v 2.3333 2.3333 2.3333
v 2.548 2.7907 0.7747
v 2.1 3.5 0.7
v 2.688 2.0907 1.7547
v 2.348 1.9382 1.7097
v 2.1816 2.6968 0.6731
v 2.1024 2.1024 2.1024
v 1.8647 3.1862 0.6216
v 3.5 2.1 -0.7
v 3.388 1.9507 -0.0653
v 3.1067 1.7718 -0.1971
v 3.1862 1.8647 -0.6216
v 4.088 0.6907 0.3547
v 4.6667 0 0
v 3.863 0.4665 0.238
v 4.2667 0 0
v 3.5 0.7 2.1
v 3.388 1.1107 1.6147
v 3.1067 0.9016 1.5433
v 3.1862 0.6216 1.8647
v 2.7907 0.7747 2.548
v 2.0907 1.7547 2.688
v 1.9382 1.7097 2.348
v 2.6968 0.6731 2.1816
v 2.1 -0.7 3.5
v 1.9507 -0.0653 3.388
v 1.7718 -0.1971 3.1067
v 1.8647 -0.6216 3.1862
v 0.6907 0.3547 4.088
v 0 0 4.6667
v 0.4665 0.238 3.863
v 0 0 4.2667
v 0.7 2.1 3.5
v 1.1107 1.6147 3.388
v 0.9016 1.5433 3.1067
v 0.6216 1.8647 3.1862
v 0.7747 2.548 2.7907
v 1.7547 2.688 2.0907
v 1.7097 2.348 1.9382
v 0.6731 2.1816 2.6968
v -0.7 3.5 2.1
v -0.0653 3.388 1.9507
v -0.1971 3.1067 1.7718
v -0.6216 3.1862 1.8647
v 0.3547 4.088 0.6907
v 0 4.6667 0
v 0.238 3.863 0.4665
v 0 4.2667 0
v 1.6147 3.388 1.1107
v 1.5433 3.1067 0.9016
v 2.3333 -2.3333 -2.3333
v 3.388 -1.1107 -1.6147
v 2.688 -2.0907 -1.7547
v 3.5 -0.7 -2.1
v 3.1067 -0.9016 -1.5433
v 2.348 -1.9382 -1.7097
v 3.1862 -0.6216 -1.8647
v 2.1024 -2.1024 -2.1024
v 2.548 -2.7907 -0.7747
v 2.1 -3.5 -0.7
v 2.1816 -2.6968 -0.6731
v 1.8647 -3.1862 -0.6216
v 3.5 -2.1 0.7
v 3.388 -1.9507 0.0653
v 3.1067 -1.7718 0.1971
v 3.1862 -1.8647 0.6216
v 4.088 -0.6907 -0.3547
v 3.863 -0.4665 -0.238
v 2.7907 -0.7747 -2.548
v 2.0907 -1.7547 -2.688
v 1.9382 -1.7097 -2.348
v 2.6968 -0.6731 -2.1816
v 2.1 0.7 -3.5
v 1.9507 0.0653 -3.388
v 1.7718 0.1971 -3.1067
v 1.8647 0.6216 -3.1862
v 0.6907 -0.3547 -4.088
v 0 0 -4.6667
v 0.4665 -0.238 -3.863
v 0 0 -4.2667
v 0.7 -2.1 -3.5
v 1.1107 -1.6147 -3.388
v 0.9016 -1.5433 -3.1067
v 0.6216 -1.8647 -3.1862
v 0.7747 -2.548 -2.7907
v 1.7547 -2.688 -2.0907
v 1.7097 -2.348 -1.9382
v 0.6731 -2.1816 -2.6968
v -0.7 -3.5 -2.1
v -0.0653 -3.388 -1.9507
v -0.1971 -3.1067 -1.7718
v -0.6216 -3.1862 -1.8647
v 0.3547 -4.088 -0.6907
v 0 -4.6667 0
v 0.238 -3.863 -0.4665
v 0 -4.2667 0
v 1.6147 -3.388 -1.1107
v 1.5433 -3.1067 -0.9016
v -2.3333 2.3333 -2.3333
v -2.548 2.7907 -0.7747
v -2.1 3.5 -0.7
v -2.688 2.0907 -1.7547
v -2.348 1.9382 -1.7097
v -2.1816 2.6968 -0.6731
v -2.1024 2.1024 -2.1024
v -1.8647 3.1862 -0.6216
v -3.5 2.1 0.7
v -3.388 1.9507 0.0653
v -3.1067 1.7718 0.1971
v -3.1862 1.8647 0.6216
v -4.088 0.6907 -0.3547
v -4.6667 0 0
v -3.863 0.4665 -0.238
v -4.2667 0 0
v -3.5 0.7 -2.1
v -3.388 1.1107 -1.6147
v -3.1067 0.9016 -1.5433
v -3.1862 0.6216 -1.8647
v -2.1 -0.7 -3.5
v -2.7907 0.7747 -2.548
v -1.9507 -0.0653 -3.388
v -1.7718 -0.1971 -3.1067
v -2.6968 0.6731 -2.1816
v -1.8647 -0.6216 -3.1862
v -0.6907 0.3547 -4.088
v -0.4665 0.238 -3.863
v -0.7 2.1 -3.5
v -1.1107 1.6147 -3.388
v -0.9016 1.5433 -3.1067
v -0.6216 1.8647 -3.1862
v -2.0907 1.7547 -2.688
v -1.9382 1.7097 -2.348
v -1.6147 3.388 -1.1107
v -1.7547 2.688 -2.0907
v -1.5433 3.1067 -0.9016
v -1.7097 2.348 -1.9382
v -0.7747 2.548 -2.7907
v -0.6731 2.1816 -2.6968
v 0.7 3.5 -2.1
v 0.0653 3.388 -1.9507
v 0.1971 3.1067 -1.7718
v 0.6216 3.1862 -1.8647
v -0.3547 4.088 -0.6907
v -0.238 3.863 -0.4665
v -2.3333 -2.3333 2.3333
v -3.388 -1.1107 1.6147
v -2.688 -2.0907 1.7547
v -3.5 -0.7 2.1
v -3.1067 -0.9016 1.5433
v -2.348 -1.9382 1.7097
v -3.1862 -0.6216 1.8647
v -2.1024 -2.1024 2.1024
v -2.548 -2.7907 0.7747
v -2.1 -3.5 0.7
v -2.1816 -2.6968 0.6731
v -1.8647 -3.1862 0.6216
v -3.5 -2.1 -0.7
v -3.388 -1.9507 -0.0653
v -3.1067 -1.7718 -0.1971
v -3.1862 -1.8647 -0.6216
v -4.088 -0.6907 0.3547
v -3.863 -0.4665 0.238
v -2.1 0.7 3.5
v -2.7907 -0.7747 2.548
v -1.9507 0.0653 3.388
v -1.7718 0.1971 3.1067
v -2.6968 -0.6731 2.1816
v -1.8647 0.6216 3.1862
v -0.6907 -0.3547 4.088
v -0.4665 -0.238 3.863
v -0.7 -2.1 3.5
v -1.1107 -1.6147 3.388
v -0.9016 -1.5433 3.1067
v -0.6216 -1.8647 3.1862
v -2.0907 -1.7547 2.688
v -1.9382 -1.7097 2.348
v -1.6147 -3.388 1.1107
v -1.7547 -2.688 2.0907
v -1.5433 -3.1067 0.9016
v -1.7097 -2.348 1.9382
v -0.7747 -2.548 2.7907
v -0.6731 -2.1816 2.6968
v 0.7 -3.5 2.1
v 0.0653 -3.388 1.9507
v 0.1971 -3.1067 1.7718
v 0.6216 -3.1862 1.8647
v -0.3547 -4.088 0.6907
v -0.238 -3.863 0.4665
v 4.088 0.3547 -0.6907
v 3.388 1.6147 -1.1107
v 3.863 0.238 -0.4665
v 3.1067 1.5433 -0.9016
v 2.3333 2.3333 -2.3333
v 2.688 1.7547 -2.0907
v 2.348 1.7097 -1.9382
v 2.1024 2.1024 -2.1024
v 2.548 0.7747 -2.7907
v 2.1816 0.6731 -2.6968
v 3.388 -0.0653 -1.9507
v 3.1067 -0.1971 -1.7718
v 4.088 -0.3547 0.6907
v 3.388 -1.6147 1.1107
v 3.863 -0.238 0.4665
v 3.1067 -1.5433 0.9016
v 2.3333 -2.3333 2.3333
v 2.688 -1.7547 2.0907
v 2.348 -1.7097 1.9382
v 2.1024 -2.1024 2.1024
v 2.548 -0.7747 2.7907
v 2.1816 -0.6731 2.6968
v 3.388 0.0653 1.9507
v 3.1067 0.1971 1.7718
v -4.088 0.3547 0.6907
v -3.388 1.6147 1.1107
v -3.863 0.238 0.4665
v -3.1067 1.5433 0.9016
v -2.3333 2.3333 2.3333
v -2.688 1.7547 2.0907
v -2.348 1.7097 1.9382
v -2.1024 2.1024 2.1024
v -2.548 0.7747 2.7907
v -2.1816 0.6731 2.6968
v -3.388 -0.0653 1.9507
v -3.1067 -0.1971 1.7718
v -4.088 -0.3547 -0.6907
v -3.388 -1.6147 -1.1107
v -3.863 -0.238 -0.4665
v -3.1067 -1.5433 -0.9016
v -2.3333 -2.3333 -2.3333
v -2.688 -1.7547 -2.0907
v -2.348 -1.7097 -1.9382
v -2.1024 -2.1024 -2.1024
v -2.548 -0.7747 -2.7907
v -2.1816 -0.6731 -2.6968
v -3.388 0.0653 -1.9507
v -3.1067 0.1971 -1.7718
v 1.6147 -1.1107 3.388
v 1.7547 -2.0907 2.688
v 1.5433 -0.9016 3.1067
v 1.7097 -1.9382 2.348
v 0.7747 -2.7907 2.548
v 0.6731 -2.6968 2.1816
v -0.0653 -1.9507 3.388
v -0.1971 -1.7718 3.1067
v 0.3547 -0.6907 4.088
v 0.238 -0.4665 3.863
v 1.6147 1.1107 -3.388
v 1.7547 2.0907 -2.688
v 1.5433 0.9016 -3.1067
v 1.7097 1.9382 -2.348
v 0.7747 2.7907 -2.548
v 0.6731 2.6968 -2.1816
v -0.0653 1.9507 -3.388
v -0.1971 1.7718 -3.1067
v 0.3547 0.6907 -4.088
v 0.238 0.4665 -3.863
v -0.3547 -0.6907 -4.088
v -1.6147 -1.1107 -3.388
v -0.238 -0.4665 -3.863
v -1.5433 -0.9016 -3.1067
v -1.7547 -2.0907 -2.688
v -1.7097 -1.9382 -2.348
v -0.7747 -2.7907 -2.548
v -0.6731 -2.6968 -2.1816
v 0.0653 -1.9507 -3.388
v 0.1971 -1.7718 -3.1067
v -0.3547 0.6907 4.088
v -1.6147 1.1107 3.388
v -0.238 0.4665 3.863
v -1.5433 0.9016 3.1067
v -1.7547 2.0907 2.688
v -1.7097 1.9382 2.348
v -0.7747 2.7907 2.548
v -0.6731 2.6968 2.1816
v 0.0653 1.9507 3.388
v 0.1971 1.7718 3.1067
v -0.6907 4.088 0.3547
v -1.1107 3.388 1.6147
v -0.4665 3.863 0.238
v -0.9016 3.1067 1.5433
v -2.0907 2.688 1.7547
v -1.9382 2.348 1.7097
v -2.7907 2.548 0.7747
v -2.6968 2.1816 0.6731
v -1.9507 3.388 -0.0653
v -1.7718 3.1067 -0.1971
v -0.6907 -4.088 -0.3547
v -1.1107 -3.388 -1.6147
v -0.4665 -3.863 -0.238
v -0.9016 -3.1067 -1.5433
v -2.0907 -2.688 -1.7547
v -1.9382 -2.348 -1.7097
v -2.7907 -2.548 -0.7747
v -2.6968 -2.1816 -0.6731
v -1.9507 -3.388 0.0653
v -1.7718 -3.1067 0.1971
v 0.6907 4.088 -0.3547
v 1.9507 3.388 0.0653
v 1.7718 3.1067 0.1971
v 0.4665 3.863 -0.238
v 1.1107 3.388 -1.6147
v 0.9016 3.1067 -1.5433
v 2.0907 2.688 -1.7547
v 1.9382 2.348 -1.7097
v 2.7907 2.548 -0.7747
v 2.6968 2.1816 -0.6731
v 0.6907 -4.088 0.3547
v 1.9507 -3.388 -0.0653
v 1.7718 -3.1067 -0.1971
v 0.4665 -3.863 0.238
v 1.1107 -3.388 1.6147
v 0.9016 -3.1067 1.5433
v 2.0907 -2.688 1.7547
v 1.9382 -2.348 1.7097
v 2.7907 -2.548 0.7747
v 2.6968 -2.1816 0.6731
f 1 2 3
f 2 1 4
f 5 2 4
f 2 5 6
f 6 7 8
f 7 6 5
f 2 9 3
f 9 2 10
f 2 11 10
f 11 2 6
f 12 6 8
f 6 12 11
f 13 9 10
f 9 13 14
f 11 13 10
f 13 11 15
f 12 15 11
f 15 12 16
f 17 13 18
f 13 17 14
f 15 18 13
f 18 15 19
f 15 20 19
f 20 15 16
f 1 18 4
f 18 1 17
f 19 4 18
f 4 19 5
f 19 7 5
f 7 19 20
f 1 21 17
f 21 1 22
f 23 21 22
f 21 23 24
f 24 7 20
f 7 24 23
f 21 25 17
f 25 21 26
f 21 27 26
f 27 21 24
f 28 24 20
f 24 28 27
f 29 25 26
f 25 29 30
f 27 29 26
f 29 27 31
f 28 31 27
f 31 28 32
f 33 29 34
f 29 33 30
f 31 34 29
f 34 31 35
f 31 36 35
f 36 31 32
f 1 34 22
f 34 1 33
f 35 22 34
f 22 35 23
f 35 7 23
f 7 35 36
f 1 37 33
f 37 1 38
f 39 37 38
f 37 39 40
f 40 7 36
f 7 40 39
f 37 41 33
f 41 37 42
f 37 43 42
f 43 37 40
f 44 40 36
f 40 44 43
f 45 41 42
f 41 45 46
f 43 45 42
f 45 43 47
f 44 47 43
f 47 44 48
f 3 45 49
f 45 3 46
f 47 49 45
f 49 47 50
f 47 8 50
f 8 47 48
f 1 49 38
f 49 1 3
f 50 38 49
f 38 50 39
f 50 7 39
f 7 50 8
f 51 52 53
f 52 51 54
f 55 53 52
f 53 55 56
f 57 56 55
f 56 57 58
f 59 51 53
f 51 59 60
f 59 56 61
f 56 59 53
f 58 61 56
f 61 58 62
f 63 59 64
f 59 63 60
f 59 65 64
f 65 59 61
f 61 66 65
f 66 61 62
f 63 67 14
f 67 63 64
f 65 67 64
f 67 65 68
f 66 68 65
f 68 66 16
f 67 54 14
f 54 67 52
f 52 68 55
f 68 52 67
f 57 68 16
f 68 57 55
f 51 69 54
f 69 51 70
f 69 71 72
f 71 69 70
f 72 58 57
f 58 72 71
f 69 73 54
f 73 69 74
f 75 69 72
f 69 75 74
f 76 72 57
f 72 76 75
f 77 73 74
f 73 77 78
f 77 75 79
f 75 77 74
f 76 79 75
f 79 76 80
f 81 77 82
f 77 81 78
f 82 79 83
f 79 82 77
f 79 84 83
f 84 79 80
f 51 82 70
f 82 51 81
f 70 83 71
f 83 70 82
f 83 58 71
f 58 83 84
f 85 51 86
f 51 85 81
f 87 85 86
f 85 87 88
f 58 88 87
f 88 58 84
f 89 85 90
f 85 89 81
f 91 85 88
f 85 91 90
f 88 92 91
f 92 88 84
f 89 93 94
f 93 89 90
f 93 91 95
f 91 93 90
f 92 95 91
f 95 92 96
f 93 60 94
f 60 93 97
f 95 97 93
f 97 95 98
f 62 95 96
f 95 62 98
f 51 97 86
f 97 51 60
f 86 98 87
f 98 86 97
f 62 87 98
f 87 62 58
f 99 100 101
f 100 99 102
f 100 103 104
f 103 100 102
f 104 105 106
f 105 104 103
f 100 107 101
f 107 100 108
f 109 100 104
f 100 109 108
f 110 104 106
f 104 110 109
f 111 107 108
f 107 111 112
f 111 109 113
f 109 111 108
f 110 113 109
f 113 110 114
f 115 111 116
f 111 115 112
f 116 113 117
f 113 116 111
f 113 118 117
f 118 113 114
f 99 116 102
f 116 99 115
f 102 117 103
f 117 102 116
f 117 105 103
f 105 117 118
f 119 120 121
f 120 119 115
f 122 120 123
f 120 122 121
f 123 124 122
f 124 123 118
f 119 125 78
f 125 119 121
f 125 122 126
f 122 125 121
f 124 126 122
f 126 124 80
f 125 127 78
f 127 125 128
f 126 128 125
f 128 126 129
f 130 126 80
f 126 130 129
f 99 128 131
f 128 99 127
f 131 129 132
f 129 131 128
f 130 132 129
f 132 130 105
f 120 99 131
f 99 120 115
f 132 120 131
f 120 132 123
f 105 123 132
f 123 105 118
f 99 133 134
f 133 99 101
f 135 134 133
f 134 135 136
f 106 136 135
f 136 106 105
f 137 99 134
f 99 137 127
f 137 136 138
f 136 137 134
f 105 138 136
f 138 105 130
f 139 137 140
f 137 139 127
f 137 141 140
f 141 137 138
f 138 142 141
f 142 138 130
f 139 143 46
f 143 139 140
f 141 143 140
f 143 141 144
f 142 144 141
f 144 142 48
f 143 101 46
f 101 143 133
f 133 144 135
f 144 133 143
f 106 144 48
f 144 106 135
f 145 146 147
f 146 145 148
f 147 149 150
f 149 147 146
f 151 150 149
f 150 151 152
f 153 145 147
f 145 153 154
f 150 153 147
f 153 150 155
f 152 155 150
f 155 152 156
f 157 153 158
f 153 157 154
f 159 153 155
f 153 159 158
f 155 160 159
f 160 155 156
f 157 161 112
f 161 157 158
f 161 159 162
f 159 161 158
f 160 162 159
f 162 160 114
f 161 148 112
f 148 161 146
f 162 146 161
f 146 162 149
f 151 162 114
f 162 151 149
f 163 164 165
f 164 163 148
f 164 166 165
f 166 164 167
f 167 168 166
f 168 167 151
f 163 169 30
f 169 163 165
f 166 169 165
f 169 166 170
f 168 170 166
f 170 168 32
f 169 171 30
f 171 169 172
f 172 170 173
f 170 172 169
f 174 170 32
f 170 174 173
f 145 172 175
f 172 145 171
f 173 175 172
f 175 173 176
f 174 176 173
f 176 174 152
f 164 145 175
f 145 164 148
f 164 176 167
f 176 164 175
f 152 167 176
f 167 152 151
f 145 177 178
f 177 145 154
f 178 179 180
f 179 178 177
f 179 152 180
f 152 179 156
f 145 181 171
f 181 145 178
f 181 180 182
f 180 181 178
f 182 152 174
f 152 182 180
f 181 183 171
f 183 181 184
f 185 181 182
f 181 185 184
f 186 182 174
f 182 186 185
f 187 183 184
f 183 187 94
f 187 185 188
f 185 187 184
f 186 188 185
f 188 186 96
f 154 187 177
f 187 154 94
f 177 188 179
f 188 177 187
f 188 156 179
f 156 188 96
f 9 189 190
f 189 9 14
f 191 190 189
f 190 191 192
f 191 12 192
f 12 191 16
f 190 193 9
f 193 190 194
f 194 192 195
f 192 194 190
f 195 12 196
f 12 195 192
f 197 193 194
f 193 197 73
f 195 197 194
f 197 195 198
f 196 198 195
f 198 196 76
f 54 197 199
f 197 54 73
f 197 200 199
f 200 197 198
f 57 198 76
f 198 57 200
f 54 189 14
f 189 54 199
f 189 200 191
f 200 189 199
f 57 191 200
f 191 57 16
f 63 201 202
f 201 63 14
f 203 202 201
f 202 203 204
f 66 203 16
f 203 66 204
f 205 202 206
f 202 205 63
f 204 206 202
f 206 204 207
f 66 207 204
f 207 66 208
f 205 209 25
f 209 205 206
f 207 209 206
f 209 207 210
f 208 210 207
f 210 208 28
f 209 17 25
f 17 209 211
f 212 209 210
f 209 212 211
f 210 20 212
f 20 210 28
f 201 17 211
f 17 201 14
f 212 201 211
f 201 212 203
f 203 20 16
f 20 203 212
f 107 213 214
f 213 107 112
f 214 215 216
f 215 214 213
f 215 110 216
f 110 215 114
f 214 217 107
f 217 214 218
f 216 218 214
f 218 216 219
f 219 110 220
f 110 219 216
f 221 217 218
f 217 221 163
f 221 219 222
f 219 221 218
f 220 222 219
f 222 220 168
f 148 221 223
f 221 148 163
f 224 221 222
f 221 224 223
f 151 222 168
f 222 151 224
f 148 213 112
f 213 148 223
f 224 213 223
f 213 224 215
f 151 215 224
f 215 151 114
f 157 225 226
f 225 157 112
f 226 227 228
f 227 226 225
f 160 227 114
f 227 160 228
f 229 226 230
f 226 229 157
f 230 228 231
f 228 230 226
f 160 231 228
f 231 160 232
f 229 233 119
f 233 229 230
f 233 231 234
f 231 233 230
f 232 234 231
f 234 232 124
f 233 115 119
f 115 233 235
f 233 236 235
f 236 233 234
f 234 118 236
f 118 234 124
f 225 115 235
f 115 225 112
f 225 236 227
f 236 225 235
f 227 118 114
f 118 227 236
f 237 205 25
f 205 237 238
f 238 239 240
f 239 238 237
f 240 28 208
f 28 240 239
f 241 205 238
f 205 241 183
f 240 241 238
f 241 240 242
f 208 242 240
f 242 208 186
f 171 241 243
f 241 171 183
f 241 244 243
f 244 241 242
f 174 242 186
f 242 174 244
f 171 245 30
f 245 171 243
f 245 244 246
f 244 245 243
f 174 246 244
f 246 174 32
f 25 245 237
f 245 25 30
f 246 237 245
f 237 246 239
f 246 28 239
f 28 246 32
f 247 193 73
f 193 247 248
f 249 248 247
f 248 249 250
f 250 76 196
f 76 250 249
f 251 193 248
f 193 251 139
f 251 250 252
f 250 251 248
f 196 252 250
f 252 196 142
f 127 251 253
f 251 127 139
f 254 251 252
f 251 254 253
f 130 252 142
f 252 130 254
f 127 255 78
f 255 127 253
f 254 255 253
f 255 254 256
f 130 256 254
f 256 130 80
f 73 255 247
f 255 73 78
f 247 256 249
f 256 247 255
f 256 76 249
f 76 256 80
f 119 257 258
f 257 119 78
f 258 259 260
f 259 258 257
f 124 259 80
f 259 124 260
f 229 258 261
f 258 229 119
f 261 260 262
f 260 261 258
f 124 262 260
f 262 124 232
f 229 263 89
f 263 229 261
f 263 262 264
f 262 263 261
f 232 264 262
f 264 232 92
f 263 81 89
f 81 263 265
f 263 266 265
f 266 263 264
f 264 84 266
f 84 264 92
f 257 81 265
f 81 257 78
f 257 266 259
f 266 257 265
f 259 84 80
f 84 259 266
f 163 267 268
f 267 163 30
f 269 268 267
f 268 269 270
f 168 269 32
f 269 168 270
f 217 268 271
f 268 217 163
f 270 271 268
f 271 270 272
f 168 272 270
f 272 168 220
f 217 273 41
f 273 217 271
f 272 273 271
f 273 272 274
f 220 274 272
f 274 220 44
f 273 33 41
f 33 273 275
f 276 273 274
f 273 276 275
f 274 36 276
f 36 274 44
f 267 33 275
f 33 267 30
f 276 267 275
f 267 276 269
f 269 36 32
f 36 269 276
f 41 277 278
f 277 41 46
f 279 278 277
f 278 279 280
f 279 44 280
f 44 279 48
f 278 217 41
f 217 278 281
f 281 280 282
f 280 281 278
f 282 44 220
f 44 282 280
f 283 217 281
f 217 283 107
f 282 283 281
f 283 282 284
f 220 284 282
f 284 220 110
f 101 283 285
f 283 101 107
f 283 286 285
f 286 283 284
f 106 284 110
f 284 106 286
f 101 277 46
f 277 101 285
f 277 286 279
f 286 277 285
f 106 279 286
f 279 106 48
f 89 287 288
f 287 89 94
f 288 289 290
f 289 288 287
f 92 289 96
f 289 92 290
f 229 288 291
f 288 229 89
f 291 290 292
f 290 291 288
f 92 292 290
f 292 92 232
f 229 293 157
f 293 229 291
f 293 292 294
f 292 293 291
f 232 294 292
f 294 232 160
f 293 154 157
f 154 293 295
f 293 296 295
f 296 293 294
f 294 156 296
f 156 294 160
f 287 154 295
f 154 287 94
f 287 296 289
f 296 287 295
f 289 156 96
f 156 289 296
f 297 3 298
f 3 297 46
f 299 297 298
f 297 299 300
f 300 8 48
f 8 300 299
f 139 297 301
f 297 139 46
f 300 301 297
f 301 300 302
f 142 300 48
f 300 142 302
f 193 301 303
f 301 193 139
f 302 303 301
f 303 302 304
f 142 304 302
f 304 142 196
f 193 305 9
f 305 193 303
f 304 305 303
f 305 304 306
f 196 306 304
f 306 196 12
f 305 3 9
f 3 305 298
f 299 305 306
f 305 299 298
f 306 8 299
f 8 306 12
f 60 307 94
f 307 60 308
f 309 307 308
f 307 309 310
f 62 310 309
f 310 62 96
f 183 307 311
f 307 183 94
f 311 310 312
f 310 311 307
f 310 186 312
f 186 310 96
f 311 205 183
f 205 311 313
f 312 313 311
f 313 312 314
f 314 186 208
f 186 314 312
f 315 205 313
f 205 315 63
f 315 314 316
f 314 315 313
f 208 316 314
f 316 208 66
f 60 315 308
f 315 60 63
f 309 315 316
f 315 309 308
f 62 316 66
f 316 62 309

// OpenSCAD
use <conway2.scad>
function _slice(list,start,end=undef) =
    let(end = end==undef?len(list):end)
    [for(i=[start:1:end-1]) list[i]];
        
function _delete(list,pos) =
    let(l=len(list))
    pos == 0 ? [for(i=[1:1:l-1]) list[i]] :
    pos >= l-1 ? [for(i=[0:1:pos-1]) list[i]] :
    concat([for(i=[0:1:pos-1]) list[i]],
        [for(i=[pos+1:1:l-1]) list[i]]);

function _areCollinear(a,b,c) = cross(b-a,c-a) == [0,0,0];
        
function _areCoplanar(a,b,c,d) = (d-a)*cross(b-a,c-a) == 0;
    
function _findNoncollinear(list,point1,point2,pos=0) = 
    pos >= len(list) ? undef :
    ! _areCollinear(point1,point2,list[pos]) ? pos :
    _findNoncollinear(list,point1,point2,pos=pos+1);
        
function _findNoncoplanar(list,point1,point2,point3,pos=0) =
   pos >= len(list) ? undef :
   ! _areCoplanar(point1,point2,point3,list[pos]) ? pos : 
        _findNoncoplanar(list,point1,point2,point3,pos=pos+1);
        
function _isBoundedBy(a,face,strict=false) =
    cross(face[1]-face[0],face[2]-face[0])*(a-face[0]);
        
function _makeTet(a,b,c,d) =
    _isBoundedBy(d,[a,b,c]) >= 0 ? 
        [[a,b,c],[b,a,d],[c,b,d],[a,c,d]] :
        [[c,b,a],[d,a,b],[d,b,c],[d,c,a]];

function _findTri(list) = 
    let(l2=_unique(list))
    assert(len(l2)>=3)
    let(a=l2[0],
        b=l2[1],
        l3=_slice(l2,2),
        ci=_findNoncollinear(l3,a,b),        
        c=assert(ci != undef) l3[ci],
        l4=_delete(l3,ci))
        [[a,b,c],l4];
        
function _findTet(list) = 
    let(ft=_findTri(list),
        tri=ft[0],
        l4=ft[1],
        di=assert(len(l4)>0) _findNoncoplanar(l4,tri[0],tri[1],tri[2]),
        d=assert(di != undef) l4[di],
        l5=_delete(l4,di))
        [_makeTet(tri[0],tri[1],tri[2],d),l5];
    
function _find(list,value) =
    let(m=search([value],list,1)[0]) 
    m==[] ? undef : m;
           
function _unique(list,soFar=[],pos=0) =
    pos >= len(list) ? soFar :
    _find(soFar,list[pos]) == undef ? _unique(list,soFar=concat(soFar,[list[pos]]),pos=pos+1) :
    _unique(list,soFar=soFar,pos=pos+1);
    
function _makePointsAndFaces(triangles) =
    let(points=_unique([for(t=triangles) for(v=t) v]))
        [points, [for(t=triangles) [for(v=t) _find(points,v)]]];

function _sameSide(p1,p2, a,b) = 
    let(cp1 = cross(b-a, p1-a),
        cp2 = cross(b-a, p2-a)) 
        cp1*cp2 >= 0;

function _insideTriangle(p, t) = 
    _sameSide(p,t[0],t[1],t[2]) &&
    _sameSide(p,t[1],t[0],t[2]) &&
    _sameSide(p,t[2],t[0],t[1]);
            
            
function _satisfiesConstraint(p, triangle) =
    let(c=_isBoundedBy(p, triangle))
    c > 0 || (c == 0 && _insideTriangle(p, triangle));
    
            
function _insidePoly(p, triangles, pos=0) = 
    pos >= len(triangles) ? true :
    !_satisfiesConstraint(p, triangles[pos]) ? false :
    _insidePoly(p, triangles, pos=pos+1);
        
function _outerEdges(triangles) =
        let(edges=[for(t=triangles) for(e=[[t[0],t[1]],
                [t[1],t[2]],
                [t[2],t[0]]]) e])
        [for(e=edges) if(undef == _find(edges,[e[1],e[0]])) e];
                
function _unlit(triangles, p) = [for(t=triangles) if(_isBoundedBy(p, t) >= 0) t];
        
function _addToHull(h, p) = 
    let(unlit = _unlit(h,p),
        edges = _outerEdges(unlit))
        concat(unlit, [for(e=edges) [e[1],e[0],p]]);

function _expandHull(h, points, pos=0) =
    pos >= len(points) ? h :
    !_insidePoly(points[pos],h) ?  _expandHull(_addToHull(h,points[pos]),points,pos=pos+1) :
    _expandHull(h, points, pos=pos+1);
            
function pointHull3D(points) =
    let(ft=_findTet(points))
        _expandHull(ft[0], ft[1]);
        
function _traceEdges(edgeStarts,edgeEnds,soFar=undef) =
    soFar==undef ? _traceEdges(edgeStarts,edgeEnds,[edgeStarts[0]]) :
    assert(soFar[len(soFar)-1] != undef)
    len(soFar)>1 && soFar[len(soFar)-1] == soFar[0] ? _slice(soFar,1) :
    _traceEdges(edgeStarts,edgeEnds,soFar=concat(soFar,[edgeEnds[_find(edgeStarts,soFar[len(soFar)-1])]]));
        
function _project(v) = [v[0],v[1]];
        
function pointHull2D(points) = 
    let(
        p3d = concat([[0,0,1]], 
            [for(p=points) [p[0],p[1],0]]),
        h = pointHull3D(p3d),
        edgeStarts = [for(t=h) if(t[0][2]==1 || t[1][2]==1 || t[2][2]==1)
                t[0][2]==1 ? _project(t[1]) : 
                t[1][2]==1 ? _project(t[2]) :
                _project(t[0]) ],
        edgeEnds = [for(t=h) if(t[0][2]==1 || t[1][2]==1 || t[2][2]==1)
                t[0][2]==1 ? _project(t[2]) : 
                t[1][2]==1 ? _project(t[0]) :
                _project(t[1]) ])
        _traceEdges(edgeStarts,edgeEnds,soFar=[edgeStarts[0]]);

function pointHull(points) =
    len(points[0]) == 2 ? pointHull2D(points) :
        pointHull3D(points);

module pointHull(points) {
    if (len(points[0])==2) {
        polygon(pointHull2D(points));
    }
    else {
        paf = _makePointsAndFaces(pointHull3D(points));
        polyhedron(points=paf[0],faces=paf[1]);
    }
}

function extractPointsFromHull(h) =
    _unique(
        is_num(h[0][0]) ? h : [for(t=h) for(v=t) v] );

function _d22(a00,a01,a10,a11) = a00*a11-a01*a10;

function _determinant3x3(m) = m[0][0]*_d22(m[1][1],m[1][2],m[2][1],m[2][2])
    -m[0][1]*_d22(m[1][0],m[1][2],m[2][0],m[2][2])
    +m[0][2]*_d22(m[1][0],m[1][1],m[2][0],m[2][1]);
        
function _determinant2x2(m) = _d22(m[0][0],m[0][1],m[1][0],m[1][1]);

// Cramer's rule
// n.b. Determinant of matrix is the same as of its transpose
function _solve3(a,b,c) = 
    let(det=_determinant3x3([a[0],b[0],c[0]]))
    det == 0 ? undef :
    let(rhs=[a[1],b[1],c[1]],
        col0=[a[0][0],b[0][0],c[0][0]],
        col1=[a[0][1],b[0][1],c[0][1]],
        col2=[a[0][2],b[0][2],c[0][2]])
    [_determinant3x3([rhs,col1,col2]),
    _determinant3x3([col0,rhs,col2]),
    _determinant3x3([col0,col1,rhs])]/det;
        
function _solve2(a,b) =
    let(det=_determinant2x2([a[0],b[0]]))
    det == 0 ? undef :
    let(rhs=[a[1],b[1]],
        col0=[a[0][0],b[0][0]],
        col1=[a[0][1],b[0][1]])
    [_determinant2x2([rhs,col1]),
    _determinant2x2([col0,rhs])]/det;
        
function _satisfies(p,constraint) =
    p*constraint[0] <= constraint[1];

function _linearConstraintExtrema(constraints,constraintsMarked=false) =
        let(c=_unique(constraints),
            n=len(c))
        len(c[0][0]) == 3 ?
        [
        for(i=[0:1:n-1]) for(j=[i+1:1:n-1]) for(k=[j+1:1:n-1]) let(p=_solve3(c[i],c[j],c[k])) if(p!=undef && _satisfiesAll(p,c,except1=i,except2=j,except3=k)) constraintsMarked?[p,[i,j,k]]:p
        ] :
        [
        for(i=[0:1:n-1]) for(j=[i+1:1:n-1]) let(p=_solve2(c[i],c[j])) if(p!=undef && _satisfiesAll(p,c,except1=i,except2=j)) constraintsMarked?[p,[i,j,-1]]:p
        ];
        
function _satisfiesAll(p,c,except1=undef,except2=undef,except3=undef,pos=0) = 
        pos >= len(c) ? true :
        except1 == pos || except2 == pos || except3 == pos || _satisfies(p,c[pos]) ? _satisfiesAll(p,c,except1,except2,except3,pos=pos+1) : 
        false;
       

module linearConstraintShape(constraints) {
    pointHull(_linearConstraintExtrema(constraints));
}

// 3D inly
function _onPlane(v,planeIndex,data,pos=0) = 
    pos >= len(data) ? false :
    data[pos][0] == v && (data[pos][1][0] == planeIndex || data[pos][1][1] == planeIndex || data[pos][1][2] == planeIndex) ? true :
    _onPlane(v,planeIndex,data,pos=pos+1);

// 3D only
function _getFaceOnPlane(planeIndex,triangles,data) =
    let(trianglesOnPlane = [for(t=triangles) if (_onPlane(t[0],planeIndex,data) &&
        _onPlane(t[1],planeIndex,data) &&
        _onPlane(t[2],planeIndex,data)) t],
        outer = _outerEdges(trianglesOnPlane),
        edgeStarts = [for(e=outer) e[0]],
        edgeEnds = [for(e=outer) e[1]]
    ) len(outer) == 0 ? undef : 
//        echo("se",edgeStarts,edgeEnds) 
        _traceEdges(edgeStarts,edgeEnds);

// 3D only, does not work if there are multiple planes defined by the same constraint
function linearConstraintPointsAndFaces(constraints) =
    let(data=_linearConstraintExtrema(constraints,constraintsMarked=true),
    extremePoints=[for(d=data) d[0]],
        
    triangles=pointHull(extremePoints),
    hullPoints=extractPointsFromHull(triangles),
    faces=[for (i=[0:len(constraints)-1]) [for(v=_getFaceOnPlane(i,triangles,data)) if(v != undef) _find(hullPoints,v)]]
    )
    [hullPoints,faces];

function hullPoints(points) =
    extractPointsFromHull(pointHull(points));

module dualHull(points) {
    p = hullPoints(points);
    constraints = [for(v=p) [v,v*v]];
    linearConstraintShape(constraints);
}

function dualHull(points,name) =
    let(p = hullPoints(points))
    let(constraints = [for(v=p) [v,v*v]])
    linearConstraintPointsAndFaces(constraints);


points = [ [3, 2, 1]
, [3, -2, -1]
, [-3, 2, -1]
, [-3, -2, 1]
, [2, 1, 3]
, [2, -1, -3]
, [-2, 1, -3]
, [-2, -1, 3]
, [1, 3, 2]
, [1, -3, -2]
, [-1, 3, -2]
, [-1, -3, 2]
, [3, 1, -2]
, [3, -1, 2]
, [-3, 1, 2]
, [-3, -1, -2]
, [1, -2, 3]
, [1, 2, -3]
, [-1, -2, -3]
, [-1, 2, 3]
, [-2, 3, 1]
, [-2, -3, -1]
, [2, 3, -1]
, [2, -3, 1]];

//for (p=points) echo(p,norm(p));
s=dualHull(points);
solid_1=["pentagonal icositetrahedron",s[0],s[1]];
solid_3 = dual(solid_1);
solid_2 = openface(solid_1,outer_inset_ratio=0.4,inner_inset_ratio=0.3,depth=0.4,fn=[]);    
p_render(solid_2);
